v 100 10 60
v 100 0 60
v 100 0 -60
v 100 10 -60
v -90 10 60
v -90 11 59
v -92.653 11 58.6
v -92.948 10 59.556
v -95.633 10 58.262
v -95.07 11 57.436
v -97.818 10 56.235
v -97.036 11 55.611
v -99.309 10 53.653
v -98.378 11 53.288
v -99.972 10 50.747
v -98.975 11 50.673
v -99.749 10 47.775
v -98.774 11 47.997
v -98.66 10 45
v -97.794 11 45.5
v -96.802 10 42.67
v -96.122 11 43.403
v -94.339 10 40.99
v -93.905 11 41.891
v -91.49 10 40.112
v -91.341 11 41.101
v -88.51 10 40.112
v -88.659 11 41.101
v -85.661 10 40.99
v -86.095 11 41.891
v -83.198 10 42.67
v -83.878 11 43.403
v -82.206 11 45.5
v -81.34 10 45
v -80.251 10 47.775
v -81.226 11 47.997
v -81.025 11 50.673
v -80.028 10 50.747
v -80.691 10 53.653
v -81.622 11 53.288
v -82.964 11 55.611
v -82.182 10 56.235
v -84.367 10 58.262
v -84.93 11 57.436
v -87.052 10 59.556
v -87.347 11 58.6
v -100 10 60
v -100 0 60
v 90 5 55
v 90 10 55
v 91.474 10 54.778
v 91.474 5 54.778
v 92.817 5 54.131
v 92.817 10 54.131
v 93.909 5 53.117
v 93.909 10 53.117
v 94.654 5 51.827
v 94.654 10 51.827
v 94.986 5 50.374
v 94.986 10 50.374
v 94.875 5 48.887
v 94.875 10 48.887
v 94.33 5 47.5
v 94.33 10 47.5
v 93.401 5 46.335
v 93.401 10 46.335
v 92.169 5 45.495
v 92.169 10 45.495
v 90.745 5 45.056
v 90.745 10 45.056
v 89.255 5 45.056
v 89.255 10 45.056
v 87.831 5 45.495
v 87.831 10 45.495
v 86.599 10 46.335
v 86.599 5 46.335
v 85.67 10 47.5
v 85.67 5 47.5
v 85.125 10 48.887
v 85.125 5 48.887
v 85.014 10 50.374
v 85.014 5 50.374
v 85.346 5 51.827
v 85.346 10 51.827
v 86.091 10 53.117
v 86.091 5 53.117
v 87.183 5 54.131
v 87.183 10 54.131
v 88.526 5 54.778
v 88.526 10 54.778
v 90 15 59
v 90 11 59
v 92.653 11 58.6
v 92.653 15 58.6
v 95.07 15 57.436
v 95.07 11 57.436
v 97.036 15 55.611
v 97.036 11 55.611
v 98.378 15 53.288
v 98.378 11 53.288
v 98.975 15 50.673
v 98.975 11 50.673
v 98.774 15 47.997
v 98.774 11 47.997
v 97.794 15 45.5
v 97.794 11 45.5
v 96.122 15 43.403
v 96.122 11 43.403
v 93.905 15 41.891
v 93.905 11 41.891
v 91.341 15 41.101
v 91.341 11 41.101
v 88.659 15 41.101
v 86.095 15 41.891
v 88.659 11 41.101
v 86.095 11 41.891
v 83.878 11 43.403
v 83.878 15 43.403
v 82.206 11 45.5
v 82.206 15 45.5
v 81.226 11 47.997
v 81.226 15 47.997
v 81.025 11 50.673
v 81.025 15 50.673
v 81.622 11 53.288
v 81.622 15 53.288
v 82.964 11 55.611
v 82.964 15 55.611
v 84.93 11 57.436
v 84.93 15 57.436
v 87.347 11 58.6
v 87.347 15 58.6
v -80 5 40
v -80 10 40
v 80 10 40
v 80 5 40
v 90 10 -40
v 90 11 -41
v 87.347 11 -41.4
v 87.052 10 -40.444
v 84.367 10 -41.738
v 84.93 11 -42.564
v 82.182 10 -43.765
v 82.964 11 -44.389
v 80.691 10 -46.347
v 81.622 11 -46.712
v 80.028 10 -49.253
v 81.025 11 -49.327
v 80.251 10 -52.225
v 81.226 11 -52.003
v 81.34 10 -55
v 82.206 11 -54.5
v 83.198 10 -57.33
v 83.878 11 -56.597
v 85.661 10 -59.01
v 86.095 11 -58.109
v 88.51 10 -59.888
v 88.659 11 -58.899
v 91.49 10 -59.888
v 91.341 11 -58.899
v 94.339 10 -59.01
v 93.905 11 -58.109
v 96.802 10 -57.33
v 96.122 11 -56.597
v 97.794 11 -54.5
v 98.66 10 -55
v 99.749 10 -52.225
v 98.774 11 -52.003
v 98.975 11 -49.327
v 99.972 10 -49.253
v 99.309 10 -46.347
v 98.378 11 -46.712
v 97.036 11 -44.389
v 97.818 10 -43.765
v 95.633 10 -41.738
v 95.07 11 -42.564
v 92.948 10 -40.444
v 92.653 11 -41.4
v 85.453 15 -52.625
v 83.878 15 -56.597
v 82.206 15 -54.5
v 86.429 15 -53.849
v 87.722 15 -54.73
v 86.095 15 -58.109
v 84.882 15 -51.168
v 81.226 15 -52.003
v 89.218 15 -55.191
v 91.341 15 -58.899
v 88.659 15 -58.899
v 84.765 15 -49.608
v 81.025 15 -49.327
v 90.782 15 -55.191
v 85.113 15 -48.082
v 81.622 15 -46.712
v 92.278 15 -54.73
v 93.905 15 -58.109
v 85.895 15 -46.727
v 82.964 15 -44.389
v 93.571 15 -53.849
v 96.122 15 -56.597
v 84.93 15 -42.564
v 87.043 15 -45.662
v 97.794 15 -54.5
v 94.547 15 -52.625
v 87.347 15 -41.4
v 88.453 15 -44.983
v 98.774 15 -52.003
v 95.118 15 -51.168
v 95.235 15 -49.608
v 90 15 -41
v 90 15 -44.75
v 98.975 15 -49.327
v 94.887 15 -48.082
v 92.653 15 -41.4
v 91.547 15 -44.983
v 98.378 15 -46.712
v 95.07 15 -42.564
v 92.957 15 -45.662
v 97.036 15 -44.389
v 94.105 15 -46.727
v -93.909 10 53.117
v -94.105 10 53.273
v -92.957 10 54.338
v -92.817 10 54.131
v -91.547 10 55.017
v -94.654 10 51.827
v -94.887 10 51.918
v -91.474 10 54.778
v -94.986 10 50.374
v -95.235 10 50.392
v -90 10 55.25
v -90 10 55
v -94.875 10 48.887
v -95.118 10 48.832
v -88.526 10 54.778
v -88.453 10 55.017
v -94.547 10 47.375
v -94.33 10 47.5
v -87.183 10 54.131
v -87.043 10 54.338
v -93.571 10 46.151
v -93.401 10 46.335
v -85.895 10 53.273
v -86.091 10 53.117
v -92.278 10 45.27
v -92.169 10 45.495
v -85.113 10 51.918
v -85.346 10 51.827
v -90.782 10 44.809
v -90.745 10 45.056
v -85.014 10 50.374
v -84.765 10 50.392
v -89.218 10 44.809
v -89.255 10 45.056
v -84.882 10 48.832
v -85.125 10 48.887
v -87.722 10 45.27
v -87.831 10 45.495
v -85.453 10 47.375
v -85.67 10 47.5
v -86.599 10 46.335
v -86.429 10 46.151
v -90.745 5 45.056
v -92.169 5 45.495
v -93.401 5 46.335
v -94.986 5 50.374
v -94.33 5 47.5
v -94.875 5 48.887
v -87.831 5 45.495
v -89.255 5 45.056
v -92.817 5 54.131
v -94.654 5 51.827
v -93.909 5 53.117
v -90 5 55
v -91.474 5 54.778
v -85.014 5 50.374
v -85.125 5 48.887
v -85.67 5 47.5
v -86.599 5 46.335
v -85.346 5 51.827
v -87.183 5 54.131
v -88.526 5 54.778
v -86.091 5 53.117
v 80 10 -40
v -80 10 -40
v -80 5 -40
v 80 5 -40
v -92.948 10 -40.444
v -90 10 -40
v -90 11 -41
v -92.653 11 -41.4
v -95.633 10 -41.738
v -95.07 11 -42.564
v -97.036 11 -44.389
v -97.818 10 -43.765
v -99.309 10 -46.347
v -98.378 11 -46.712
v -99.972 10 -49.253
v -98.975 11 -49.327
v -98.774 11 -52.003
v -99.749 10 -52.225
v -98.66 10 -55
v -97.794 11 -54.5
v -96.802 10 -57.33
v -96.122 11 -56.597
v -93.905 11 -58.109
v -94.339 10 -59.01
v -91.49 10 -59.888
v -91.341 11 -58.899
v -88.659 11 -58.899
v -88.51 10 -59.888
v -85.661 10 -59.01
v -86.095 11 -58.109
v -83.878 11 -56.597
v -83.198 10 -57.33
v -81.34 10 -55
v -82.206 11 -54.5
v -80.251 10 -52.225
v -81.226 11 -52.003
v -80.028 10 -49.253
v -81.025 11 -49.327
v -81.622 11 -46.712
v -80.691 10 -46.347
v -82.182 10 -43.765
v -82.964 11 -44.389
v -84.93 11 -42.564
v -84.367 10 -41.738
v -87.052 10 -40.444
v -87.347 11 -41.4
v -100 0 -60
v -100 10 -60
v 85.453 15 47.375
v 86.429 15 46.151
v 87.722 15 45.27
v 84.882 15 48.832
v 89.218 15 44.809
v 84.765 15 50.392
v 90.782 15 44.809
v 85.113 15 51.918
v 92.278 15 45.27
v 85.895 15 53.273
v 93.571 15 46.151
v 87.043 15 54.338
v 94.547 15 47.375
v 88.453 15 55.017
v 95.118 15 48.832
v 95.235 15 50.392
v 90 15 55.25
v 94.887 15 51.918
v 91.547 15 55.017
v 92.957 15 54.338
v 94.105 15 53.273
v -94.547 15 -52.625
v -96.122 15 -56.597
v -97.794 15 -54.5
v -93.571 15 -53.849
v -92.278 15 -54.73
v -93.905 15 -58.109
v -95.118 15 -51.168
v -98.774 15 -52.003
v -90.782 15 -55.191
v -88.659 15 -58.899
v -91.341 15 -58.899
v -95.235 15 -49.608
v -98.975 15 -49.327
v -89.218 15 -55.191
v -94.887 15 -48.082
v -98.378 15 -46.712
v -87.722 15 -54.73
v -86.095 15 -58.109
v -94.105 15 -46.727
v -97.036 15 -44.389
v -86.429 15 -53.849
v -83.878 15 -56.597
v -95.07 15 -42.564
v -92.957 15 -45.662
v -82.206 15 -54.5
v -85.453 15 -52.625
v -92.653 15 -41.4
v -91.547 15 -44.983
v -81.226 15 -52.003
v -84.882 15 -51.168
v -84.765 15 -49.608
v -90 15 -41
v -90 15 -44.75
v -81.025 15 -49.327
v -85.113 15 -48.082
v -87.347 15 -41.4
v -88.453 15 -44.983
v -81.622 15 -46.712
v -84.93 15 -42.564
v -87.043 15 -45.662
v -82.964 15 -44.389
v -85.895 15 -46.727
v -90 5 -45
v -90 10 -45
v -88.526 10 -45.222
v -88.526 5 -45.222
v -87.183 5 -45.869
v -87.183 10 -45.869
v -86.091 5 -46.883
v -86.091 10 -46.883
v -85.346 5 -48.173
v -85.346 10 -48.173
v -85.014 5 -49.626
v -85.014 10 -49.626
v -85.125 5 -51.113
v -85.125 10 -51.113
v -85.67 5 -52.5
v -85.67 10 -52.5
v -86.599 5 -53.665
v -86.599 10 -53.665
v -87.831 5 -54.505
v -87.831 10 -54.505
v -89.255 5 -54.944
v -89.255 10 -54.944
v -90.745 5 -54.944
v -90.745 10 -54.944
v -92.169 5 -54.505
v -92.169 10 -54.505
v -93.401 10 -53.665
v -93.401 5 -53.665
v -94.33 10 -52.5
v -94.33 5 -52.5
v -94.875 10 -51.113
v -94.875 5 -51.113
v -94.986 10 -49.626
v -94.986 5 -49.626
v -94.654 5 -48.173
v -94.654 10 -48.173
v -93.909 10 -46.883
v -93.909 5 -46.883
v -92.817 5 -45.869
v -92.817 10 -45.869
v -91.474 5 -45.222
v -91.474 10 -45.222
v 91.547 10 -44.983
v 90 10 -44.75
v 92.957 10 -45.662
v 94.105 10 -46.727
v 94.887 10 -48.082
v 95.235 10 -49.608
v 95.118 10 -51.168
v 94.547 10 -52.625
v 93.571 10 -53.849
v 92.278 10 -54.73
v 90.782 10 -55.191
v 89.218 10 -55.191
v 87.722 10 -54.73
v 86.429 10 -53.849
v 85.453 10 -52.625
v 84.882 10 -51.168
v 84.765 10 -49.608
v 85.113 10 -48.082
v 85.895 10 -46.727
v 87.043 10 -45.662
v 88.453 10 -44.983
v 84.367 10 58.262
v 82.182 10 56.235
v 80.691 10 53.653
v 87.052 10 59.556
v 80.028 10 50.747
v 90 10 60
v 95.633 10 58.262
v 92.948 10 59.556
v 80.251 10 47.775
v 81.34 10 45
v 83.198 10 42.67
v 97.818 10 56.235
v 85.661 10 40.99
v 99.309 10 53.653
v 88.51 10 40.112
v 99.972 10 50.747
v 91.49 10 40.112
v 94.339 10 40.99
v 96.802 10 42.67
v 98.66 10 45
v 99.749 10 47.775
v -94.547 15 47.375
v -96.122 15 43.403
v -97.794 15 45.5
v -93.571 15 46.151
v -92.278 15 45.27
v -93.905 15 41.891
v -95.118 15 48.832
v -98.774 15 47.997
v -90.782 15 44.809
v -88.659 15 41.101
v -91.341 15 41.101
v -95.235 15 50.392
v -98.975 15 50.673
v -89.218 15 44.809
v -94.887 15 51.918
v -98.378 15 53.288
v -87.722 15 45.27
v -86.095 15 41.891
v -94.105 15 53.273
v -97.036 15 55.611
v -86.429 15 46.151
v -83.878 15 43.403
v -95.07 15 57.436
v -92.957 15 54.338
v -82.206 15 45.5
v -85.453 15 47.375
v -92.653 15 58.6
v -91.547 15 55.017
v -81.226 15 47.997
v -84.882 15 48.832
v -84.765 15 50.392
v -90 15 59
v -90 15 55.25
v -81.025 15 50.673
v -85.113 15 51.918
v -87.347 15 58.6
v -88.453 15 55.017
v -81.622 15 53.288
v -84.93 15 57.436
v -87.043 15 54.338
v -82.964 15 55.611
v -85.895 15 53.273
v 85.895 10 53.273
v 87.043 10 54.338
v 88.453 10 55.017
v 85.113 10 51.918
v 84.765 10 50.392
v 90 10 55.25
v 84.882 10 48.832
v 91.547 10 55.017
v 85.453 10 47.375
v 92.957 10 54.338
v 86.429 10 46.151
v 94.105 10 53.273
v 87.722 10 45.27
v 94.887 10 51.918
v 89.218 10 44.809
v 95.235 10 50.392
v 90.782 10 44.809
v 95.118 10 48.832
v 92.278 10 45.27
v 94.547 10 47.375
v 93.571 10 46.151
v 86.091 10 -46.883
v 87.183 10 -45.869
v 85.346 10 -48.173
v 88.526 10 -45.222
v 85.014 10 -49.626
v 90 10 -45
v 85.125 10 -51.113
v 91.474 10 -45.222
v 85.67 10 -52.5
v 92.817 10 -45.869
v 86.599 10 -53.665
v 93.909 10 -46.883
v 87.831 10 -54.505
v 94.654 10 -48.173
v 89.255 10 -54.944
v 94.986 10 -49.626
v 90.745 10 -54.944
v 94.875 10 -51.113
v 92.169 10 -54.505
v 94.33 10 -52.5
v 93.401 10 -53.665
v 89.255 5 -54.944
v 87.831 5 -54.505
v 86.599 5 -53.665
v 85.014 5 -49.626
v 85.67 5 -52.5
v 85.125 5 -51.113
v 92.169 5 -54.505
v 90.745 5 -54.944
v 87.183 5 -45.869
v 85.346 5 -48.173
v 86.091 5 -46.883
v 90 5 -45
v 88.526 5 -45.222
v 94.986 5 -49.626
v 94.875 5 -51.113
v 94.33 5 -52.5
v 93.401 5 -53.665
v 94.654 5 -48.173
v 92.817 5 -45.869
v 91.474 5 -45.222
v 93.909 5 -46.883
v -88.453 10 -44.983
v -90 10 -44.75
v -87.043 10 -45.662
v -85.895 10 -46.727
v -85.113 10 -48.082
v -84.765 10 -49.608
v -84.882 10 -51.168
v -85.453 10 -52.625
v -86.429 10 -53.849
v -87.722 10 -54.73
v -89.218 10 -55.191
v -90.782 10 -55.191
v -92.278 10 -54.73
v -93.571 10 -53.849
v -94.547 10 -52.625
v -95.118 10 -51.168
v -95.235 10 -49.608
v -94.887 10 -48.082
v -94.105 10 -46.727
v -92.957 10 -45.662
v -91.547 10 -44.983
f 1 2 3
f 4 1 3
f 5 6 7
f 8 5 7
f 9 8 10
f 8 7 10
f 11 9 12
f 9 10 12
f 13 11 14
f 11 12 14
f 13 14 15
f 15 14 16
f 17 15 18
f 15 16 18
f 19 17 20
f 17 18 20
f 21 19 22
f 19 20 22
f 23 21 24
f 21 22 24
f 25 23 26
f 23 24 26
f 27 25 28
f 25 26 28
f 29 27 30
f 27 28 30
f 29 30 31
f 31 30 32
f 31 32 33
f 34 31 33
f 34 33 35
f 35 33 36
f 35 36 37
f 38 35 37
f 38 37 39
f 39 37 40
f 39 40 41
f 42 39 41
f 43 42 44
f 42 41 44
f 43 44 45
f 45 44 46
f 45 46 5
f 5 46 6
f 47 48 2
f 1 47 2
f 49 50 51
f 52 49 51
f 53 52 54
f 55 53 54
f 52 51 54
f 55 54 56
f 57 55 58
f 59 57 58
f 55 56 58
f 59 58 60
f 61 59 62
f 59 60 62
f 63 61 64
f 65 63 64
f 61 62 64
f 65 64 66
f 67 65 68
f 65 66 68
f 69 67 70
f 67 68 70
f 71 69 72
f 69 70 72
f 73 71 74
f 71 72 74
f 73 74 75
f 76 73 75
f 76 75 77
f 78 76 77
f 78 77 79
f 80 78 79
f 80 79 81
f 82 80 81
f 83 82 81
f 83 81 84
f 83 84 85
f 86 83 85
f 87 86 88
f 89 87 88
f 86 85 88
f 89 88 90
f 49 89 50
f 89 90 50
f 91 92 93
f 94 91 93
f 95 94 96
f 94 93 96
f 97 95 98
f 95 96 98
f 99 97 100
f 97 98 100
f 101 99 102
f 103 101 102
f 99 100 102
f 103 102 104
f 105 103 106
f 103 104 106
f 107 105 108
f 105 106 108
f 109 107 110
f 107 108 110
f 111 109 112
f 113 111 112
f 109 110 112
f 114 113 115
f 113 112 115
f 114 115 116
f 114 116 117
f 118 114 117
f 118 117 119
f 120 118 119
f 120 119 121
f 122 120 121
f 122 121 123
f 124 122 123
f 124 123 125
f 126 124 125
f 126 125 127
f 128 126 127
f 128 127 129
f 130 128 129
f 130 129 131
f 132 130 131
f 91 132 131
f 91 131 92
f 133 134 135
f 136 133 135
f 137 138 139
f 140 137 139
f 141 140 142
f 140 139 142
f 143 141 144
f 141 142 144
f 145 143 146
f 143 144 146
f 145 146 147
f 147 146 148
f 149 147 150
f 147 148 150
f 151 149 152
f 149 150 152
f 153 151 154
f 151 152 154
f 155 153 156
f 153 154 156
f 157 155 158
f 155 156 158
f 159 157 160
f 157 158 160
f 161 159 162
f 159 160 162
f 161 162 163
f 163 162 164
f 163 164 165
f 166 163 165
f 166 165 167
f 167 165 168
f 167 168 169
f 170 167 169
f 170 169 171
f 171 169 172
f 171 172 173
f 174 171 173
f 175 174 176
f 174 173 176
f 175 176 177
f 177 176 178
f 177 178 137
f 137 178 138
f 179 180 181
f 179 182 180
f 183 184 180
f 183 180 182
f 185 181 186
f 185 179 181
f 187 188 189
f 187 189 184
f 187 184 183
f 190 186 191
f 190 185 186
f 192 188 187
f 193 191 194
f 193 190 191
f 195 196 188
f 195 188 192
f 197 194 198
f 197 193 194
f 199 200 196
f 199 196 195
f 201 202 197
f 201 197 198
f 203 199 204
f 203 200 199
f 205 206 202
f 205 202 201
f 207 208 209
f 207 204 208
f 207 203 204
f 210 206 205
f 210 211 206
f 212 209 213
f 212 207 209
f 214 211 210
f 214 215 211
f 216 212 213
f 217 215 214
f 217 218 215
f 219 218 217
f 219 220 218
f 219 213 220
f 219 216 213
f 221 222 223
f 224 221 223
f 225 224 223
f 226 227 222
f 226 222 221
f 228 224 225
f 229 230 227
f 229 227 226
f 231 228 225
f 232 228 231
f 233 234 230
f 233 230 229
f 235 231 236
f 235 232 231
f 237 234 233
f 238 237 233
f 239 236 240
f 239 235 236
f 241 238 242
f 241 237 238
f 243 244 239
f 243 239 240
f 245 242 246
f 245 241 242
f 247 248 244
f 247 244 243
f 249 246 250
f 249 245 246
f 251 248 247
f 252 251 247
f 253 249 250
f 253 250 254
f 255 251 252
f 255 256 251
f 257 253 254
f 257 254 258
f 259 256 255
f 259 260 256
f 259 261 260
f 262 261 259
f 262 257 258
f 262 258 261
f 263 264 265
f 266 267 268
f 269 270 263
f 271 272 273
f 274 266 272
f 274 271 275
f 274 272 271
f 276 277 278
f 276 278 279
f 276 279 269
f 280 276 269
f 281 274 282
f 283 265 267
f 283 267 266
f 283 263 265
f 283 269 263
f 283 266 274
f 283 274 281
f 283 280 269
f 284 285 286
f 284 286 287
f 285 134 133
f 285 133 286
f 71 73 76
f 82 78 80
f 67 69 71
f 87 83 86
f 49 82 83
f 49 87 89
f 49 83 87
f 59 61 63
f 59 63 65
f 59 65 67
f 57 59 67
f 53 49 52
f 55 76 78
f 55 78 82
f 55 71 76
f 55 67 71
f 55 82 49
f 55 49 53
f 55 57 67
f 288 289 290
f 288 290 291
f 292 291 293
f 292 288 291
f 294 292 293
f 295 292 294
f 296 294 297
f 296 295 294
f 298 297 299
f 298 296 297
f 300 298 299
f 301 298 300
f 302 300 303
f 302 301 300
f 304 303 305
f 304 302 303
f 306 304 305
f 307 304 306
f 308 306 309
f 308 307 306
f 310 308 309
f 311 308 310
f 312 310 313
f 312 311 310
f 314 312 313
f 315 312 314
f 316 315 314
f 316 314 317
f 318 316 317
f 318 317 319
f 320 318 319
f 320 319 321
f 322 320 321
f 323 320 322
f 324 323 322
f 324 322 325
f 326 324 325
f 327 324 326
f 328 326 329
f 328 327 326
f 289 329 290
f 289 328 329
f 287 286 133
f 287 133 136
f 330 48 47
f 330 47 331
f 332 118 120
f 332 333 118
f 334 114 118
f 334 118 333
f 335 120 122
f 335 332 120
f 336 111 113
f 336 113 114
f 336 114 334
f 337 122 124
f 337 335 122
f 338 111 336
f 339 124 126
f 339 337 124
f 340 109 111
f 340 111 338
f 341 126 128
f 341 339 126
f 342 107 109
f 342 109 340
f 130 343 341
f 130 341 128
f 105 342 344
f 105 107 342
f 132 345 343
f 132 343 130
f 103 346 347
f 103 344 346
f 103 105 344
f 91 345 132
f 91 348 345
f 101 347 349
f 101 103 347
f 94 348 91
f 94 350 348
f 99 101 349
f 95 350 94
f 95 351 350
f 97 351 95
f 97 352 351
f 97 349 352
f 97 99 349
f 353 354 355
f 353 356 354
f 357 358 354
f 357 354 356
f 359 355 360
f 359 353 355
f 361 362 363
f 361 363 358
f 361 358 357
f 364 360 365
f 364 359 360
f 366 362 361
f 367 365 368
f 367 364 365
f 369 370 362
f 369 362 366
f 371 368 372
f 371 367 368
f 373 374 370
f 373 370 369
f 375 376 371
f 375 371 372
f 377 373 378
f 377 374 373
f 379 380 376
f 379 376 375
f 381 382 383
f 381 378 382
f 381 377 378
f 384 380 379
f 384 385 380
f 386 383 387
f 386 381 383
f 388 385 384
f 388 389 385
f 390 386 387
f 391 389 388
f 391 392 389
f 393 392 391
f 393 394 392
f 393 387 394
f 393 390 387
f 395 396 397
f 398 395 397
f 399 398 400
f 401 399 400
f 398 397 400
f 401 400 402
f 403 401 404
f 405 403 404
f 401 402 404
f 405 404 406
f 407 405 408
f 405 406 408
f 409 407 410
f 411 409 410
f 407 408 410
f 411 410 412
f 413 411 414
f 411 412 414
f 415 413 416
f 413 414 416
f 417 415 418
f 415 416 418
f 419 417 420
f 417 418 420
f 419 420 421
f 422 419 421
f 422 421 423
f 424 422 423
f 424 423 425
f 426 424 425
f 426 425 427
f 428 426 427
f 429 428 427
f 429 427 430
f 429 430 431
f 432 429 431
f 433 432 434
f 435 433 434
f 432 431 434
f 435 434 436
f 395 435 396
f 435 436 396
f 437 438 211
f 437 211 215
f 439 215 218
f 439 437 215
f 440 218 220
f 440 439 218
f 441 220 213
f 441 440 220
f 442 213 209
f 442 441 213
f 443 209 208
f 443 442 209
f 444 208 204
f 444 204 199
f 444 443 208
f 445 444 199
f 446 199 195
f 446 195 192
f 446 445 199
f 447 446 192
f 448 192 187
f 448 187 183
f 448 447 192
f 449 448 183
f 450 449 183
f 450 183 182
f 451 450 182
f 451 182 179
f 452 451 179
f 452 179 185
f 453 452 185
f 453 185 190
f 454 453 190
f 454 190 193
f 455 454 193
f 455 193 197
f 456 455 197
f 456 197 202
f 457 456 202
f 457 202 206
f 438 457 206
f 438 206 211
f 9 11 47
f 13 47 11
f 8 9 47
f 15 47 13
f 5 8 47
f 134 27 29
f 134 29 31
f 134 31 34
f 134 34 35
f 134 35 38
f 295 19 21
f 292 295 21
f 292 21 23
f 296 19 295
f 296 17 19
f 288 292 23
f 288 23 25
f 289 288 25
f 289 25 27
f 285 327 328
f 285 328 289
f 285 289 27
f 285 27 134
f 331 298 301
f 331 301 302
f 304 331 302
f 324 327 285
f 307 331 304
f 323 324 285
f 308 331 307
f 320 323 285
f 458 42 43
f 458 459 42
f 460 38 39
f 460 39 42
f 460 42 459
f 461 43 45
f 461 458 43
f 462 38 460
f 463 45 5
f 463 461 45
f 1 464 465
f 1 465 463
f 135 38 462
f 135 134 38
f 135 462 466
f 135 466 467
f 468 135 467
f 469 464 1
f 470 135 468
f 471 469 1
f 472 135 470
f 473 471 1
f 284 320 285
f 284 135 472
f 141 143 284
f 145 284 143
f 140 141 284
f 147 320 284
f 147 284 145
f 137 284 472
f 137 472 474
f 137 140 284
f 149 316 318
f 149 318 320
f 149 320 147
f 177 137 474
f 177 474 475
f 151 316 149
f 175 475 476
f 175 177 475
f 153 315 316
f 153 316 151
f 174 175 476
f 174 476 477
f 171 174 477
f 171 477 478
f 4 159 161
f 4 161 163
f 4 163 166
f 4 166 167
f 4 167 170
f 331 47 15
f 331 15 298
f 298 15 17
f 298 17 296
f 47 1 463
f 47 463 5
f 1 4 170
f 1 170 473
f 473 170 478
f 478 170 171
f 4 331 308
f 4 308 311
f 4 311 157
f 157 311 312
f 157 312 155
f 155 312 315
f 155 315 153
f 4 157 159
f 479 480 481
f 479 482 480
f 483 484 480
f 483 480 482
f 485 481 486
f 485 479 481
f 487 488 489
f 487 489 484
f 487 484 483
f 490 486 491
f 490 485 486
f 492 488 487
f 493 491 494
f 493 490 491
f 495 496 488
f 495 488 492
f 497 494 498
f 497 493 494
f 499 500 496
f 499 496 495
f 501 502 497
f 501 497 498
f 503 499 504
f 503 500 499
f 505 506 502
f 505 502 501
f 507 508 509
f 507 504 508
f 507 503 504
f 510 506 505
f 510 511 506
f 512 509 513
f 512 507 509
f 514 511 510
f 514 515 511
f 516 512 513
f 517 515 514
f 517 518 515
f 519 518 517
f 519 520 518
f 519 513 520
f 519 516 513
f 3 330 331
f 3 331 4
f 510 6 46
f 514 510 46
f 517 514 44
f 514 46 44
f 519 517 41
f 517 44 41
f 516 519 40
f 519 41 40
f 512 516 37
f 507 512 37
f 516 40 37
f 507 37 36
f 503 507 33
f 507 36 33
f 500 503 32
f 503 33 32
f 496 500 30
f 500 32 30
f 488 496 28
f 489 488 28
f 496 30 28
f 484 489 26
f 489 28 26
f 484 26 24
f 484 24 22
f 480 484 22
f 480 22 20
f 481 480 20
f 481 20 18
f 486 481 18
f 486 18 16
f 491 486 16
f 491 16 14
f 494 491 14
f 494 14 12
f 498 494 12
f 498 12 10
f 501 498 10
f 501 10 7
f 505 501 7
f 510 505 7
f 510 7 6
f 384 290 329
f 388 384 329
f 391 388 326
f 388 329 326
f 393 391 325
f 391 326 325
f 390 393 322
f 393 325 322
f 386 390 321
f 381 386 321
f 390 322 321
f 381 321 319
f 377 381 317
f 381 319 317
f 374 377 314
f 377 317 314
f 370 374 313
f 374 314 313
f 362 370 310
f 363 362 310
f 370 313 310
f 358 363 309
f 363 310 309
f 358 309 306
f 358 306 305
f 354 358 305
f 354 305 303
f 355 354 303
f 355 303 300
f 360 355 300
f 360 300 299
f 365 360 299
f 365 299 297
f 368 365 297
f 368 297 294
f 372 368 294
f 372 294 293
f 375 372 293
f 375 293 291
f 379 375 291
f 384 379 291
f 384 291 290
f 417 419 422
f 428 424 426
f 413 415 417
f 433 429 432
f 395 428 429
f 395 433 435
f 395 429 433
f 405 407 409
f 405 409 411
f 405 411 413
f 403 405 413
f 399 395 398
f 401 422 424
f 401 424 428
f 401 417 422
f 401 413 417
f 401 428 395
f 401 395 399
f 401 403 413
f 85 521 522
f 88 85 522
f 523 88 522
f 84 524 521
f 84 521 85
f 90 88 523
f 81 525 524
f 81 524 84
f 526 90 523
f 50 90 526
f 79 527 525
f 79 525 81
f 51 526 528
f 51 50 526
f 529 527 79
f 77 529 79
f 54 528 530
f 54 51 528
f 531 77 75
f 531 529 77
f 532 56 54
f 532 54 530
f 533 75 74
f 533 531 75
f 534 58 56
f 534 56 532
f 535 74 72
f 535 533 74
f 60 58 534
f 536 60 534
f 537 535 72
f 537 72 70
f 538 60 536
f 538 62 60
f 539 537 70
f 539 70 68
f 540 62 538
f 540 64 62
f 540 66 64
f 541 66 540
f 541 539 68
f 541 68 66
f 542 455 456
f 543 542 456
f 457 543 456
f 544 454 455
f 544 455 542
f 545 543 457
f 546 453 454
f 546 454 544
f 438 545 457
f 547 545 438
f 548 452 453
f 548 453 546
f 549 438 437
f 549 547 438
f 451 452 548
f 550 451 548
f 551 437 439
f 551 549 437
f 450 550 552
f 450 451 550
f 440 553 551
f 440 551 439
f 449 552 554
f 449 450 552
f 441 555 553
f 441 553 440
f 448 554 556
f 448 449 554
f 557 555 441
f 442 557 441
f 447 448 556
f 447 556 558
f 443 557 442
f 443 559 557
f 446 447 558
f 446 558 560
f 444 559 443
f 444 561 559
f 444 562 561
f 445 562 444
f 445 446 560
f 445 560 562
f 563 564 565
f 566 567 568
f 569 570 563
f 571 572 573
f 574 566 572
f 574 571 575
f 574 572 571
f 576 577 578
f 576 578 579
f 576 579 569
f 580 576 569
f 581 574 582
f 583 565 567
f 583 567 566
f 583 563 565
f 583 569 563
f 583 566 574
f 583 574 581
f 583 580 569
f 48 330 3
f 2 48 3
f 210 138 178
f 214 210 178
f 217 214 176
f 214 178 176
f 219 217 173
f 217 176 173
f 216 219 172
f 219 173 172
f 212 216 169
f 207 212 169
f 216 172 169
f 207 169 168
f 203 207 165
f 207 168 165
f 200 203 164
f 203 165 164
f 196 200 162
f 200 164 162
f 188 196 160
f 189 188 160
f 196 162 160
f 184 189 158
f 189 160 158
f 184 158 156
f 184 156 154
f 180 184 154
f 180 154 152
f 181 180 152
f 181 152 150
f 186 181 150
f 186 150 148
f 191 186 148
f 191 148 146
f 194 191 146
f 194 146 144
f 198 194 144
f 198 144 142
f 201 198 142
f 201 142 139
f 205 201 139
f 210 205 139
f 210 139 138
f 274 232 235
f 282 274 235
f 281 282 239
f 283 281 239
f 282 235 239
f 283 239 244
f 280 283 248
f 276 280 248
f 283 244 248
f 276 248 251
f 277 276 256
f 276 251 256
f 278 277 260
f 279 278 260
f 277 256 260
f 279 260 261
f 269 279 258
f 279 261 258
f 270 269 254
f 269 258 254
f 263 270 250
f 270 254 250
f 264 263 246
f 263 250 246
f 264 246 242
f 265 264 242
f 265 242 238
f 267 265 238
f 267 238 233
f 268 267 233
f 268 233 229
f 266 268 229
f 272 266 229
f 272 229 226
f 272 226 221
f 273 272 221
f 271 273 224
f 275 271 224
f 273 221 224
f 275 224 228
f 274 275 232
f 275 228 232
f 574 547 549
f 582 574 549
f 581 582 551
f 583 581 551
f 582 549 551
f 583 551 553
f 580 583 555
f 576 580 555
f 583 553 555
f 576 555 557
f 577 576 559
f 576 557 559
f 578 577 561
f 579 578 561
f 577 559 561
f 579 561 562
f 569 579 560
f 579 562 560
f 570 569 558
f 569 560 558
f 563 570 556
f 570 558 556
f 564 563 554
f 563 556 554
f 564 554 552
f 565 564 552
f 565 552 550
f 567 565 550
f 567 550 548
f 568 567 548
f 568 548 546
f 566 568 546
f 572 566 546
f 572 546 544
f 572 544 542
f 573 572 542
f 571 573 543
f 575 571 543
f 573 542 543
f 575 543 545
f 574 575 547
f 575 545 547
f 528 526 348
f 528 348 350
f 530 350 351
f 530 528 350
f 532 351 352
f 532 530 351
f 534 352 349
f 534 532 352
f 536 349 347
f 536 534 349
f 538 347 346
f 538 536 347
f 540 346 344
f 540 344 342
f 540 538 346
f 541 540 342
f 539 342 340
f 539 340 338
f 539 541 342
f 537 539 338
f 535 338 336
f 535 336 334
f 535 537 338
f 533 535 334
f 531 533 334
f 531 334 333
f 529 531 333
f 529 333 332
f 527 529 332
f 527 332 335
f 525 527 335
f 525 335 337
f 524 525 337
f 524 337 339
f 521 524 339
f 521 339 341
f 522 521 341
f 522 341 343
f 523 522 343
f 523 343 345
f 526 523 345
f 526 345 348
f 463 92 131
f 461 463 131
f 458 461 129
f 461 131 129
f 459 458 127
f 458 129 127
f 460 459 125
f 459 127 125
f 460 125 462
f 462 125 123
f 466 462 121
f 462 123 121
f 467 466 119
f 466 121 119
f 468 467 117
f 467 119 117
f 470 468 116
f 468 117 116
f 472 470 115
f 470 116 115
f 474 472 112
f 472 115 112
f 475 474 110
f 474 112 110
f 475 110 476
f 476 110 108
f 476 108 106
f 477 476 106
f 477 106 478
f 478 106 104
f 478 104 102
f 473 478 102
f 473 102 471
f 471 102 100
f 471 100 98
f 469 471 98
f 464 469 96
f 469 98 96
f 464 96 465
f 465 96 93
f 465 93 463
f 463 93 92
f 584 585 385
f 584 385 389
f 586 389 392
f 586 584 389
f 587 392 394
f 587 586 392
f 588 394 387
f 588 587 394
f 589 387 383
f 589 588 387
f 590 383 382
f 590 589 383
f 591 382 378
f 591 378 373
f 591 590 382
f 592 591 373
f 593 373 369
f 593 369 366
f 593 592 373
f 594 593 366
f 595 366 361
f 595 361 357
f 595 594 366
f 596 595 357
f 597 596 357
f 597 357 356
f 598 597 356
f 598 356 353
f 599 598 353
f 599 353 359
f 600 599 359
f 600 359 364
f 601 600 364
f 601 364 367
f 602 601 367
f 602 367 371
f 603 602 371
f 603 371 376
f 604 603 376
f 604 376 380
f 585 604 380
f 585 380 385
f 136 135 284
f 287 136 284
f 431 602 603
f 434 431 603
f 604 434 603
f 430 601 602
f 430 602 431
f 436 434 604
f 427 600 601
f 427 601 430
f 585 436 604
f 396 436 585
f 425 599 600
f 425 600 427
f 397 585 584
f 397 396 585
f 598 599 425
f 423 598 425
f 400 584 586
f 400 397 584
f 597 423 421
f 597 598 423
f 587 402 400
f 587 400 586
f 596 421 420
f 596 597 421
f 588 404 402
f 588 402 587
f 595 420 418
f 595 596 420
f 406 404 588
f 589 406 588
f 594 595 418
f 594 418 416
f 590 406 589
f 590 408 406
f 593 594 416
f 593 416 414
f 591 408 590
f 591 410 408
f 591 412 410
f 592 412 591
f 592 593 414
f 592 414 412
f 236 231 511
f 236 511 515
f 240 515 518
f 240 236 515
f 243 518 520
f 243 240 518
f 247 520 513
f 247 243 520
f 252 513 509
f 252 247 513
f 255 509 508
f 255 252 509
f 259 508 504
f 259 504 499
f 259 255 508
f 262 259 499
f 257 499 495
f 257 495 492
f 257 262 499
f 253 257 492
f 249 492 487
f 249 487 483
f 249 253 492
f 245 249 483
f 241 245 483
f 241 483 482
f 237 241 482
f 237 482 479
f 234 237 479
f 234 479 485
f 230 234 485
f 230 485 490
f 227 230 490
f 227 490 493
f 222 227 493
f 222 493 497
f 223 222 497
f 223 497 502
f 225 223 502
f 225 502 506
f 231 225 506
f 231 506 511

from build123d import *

# Parameters (mm, degrees)
SKETCH1_W           = 200
SKETCH1_H           = 120
BOSS_EXTRUDE3_DEPTH = 10
SKETCH3_R           = 5
SKETCH3_W           = 160
SKETCH3_H           = 80
CUT_EXTRUDE2_DEPTH  = 5
SKETCH6_R           = 9
SKETCH6_R_2         = 5.25
BOSS_EXTRUDE4_DEPTH = 10
CHAMFER1_SIZE       = 1


with BuildPart() as part:
    # Sketch1 → Boss-Extrude3 (new body)
    with BuildSketch(Plane(origin=(0, 0, 0), x_dir=(1, 0, 0), z_dir=(0, 1, 0))):
        Rectangle(SKETCH1_W, SKETCH1_H)
    extrude(amount=BOSS_EXTRUDE3_DEPTH)

    # Sketch3 → Cut-Extrude2 (cut)
    with BuildSketch(Plane(origin=(0, 10, 0), x_dir=(1, 0, 0), z_dir=(0, 1, 0))):
        with Locations(Location((-90, 50, 0), (0, 0, 270))):
            Circle(SKETCH3_R)
        with Locations(Location((90, -50, 0), (0, 0, 270))):
            Circle(SKETCH3_R)
        with Locations(Location((90, 50, 0), (0, 0, 270))):
            Circle(SKETCH3_R)
        with Locations(Location((-90, -50, 0), (0, 0, 270))):
            Circle(SKETCH3_R)
        Rectangle(SKETCH3_W, SKETCH3_H)
    extrude(amount=-CUT_EXTRUDE2_DEPTH, mode=Mode.SUBTRACT)

    # Sketch6 → Boss-Extrude4 (add)
    # profile 1 of 4: a face of its own
    with BuildSketch(Plane(origin=(0, 5, 0), x_dir=(1, 0, 0), z_dir=(0, 1, 0))):
        with Locations(Location((-90, 50, 0), (0, 0, 270))):
            Circle(SKETCH6_R)
        with Locations(Location((-90, 50, 0), (0, 0, 270))):
            Circle(SKETCH6_R_2, mode=Mode.SUBTRACT)
    # profile 2 of 4: a face of its own
    with BuildSketch(Plane(origin=(0, 5, 0), x_dir=(1, 0, 0), z_dir=(0, 1, 0))):
        with Locations(Location((90, 50, 0), (0, 0, 270))):
            Circle(SKETCH6_R)
        with Locations(Location((90, 50, 0), (0, 0, 270))):
            Circle(SKETCH6_R_2, mode=Mode.SUBTRACT)
    # profile 3 of 4: a face of its own
    with BuildSketch(Plane(origin=(0, 5, 0), x_dir=(1, 0, 0), z_dir=(0, 1, 0))):
        with Locations(Location((90, -50, 0), (0, 0, 270))):
            Circle(SKETCH6_R)
        with Locations(Location((90, -50, 0), (0, 0, 270))):
            Circle(SKETCH6_R_2, mode=Mode.SUBTRACT)
    # profile 4 of 4: a face of its own
    with BuildSketch(Plane(origin=(0, 5, 0), x_dir=(1, 0, 0), z_dir=(0, 1, 0))):
        with Locations(Location((-90, -50, 0), (0, 0, 270))):
            Circle(SKETCH6_R)
        with Locations(Location((-90, -50, 0), (0, 0, 270))):
            Circle(SKETCH6_R_2, mode=Mode.SUBTRACT)
    extrude(amount=BOSS_EXTRUDE4_DEPTH)

    # Chamfer1
    chamfer1_edges = [part.edges().sort_by_distance(p)[0] for p in [
        (-90, 10, -59),
        (90, 10, -59),
        (90, 10, 41),
        (-90, 10, 41),
    ]]
    chamfer(chamfer1_edges, length=CHAMFER1_SIZE - 0.0001)  # a hair under: the kernel refuses the full size


solid = part.part
